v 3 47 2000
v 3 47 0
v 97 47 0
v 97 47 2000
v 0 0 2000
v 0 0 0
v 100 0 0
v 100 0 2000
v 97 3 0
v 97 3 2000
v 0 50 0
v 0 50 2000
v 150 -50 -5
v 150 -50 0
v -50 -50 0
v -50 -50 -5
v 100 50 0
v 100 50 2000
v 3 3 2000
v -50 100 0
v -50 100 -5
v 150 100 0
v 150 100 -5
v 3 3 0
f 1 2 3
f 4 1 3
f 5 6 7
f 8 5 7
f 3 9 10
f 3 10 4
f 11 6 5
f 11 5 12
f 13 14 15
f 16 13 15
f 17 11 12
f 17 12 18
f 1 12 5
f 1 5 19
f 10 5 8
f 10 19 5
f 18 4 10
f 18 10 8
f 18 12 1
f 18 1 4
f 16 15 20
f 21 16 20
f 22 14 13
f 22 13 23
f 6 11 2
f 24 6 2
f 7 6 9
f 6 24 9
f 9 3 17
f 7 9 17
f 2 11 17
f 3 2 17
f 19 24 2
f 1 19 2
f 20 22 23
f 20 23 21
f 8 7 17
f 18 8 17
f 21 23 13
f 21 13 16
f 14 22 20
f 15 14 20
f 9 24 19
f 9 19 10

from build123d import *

# Parameters (mm, degrees)
SKETCH1_W              = 100
SKETCH1_H              = 50
SKETCH1_W_2            = 94
SKETCH1_H_2            = 44
BOSS_EXTRUDE1_DEPTH    = 2000
SKETCH2_W              = 200
SKETCH2_H              = 150
BOSS_EXTRUDE2_DEPTH    = 5
SPLIT2_SURFACE_1_BACK  = 2021.526
SPLIT2_SURFACE_1_DEPTH = 4043.052
SPLIT2_SURFACE_2_BACK  = 2021.526
SPLIT2_SURFACE_2_DEPTH = 4043.052


with BuildPart() as part:
    # Sketch1 → Boss-Extrude1 (new body)
    with BuildSketch(Plane.XY):
        with Locations((50, 25)):
            Rectangle(SKETCH1_W, SKETCH1_H)
        with Locations((50, 25)):
            Rectangle(SKETCH1_W_2, SKETCH1_H_2, mode=Mode.SUBTRACT)
    extrude(amount=BOSS_EXTRUDE1_DEPTH)

    # Sketch2 → Boss-Extrude2 (add)
    with BuildSketch(Plane(origin=(0, 0, 0), x_dir=(-1, 0, 0), z_dir=(0, 0, -1))):
        with Locations((-50, 25)):
            Rectangle(SKETCH2_W, SKETCH2_H)
    extrude(amount=BOSS_EXTRUDE2_DEPTH)


with BuildPart() as body_2:
    # Split2: the piece behind the surface
    add(part.part)
    # Split2 surface: a surface, the sketch's curves swept straight by 4043.052 mm
    with BuildLine(Plane.XZ.offset(-SPLIT2_SURFACE_1_BACK), mode=Mode.PRIVATE) as split2_surface_1_path:
        Line((-60.263801814, 0), (177.114806947, 0))
    split2_surface_1 = Shell.extrude(split2_surface_1_path.wire(), (0 * SPLIT2_SURFACE_1_DEPTH, -1 * SPLIT2_SURFACE_1_DEPTH, 0 * SPLIT2_SURFACE_1_DEPTH))
    split(bisect_by=split2_surface_1, keep=Keep.BOTTOM)


with BuildPart() as part_1:
    add(part.part)

    # Split2: split by a surface, the side it looks to stays
    # Split2 surface: a surface, the sketch's curves swept straight by 4043.052 mm
    with BuildLine(Plane.XZ.offset(-SPLIT2_SURFACE_2_BACK), mode=Mode.PRIVATE) as split2_surface_2_path:
        Line((-60.263801814, 0), (177.114806947, 0))
    split2_surface_2 = Shell.extrude(split2_surface_2_path.wire(), (0 * SPLIT2_SURFACE_2_DEPTH, -1 * SPLIT2_SURFACE_2_DEPTH, 0 * SPLIT2_SURFACE_2_DEPTH))
    split(bisect_by=split2_surface_2, keep=Keep.TOP)


solid = Compound([body_2.part, part_1.part])
